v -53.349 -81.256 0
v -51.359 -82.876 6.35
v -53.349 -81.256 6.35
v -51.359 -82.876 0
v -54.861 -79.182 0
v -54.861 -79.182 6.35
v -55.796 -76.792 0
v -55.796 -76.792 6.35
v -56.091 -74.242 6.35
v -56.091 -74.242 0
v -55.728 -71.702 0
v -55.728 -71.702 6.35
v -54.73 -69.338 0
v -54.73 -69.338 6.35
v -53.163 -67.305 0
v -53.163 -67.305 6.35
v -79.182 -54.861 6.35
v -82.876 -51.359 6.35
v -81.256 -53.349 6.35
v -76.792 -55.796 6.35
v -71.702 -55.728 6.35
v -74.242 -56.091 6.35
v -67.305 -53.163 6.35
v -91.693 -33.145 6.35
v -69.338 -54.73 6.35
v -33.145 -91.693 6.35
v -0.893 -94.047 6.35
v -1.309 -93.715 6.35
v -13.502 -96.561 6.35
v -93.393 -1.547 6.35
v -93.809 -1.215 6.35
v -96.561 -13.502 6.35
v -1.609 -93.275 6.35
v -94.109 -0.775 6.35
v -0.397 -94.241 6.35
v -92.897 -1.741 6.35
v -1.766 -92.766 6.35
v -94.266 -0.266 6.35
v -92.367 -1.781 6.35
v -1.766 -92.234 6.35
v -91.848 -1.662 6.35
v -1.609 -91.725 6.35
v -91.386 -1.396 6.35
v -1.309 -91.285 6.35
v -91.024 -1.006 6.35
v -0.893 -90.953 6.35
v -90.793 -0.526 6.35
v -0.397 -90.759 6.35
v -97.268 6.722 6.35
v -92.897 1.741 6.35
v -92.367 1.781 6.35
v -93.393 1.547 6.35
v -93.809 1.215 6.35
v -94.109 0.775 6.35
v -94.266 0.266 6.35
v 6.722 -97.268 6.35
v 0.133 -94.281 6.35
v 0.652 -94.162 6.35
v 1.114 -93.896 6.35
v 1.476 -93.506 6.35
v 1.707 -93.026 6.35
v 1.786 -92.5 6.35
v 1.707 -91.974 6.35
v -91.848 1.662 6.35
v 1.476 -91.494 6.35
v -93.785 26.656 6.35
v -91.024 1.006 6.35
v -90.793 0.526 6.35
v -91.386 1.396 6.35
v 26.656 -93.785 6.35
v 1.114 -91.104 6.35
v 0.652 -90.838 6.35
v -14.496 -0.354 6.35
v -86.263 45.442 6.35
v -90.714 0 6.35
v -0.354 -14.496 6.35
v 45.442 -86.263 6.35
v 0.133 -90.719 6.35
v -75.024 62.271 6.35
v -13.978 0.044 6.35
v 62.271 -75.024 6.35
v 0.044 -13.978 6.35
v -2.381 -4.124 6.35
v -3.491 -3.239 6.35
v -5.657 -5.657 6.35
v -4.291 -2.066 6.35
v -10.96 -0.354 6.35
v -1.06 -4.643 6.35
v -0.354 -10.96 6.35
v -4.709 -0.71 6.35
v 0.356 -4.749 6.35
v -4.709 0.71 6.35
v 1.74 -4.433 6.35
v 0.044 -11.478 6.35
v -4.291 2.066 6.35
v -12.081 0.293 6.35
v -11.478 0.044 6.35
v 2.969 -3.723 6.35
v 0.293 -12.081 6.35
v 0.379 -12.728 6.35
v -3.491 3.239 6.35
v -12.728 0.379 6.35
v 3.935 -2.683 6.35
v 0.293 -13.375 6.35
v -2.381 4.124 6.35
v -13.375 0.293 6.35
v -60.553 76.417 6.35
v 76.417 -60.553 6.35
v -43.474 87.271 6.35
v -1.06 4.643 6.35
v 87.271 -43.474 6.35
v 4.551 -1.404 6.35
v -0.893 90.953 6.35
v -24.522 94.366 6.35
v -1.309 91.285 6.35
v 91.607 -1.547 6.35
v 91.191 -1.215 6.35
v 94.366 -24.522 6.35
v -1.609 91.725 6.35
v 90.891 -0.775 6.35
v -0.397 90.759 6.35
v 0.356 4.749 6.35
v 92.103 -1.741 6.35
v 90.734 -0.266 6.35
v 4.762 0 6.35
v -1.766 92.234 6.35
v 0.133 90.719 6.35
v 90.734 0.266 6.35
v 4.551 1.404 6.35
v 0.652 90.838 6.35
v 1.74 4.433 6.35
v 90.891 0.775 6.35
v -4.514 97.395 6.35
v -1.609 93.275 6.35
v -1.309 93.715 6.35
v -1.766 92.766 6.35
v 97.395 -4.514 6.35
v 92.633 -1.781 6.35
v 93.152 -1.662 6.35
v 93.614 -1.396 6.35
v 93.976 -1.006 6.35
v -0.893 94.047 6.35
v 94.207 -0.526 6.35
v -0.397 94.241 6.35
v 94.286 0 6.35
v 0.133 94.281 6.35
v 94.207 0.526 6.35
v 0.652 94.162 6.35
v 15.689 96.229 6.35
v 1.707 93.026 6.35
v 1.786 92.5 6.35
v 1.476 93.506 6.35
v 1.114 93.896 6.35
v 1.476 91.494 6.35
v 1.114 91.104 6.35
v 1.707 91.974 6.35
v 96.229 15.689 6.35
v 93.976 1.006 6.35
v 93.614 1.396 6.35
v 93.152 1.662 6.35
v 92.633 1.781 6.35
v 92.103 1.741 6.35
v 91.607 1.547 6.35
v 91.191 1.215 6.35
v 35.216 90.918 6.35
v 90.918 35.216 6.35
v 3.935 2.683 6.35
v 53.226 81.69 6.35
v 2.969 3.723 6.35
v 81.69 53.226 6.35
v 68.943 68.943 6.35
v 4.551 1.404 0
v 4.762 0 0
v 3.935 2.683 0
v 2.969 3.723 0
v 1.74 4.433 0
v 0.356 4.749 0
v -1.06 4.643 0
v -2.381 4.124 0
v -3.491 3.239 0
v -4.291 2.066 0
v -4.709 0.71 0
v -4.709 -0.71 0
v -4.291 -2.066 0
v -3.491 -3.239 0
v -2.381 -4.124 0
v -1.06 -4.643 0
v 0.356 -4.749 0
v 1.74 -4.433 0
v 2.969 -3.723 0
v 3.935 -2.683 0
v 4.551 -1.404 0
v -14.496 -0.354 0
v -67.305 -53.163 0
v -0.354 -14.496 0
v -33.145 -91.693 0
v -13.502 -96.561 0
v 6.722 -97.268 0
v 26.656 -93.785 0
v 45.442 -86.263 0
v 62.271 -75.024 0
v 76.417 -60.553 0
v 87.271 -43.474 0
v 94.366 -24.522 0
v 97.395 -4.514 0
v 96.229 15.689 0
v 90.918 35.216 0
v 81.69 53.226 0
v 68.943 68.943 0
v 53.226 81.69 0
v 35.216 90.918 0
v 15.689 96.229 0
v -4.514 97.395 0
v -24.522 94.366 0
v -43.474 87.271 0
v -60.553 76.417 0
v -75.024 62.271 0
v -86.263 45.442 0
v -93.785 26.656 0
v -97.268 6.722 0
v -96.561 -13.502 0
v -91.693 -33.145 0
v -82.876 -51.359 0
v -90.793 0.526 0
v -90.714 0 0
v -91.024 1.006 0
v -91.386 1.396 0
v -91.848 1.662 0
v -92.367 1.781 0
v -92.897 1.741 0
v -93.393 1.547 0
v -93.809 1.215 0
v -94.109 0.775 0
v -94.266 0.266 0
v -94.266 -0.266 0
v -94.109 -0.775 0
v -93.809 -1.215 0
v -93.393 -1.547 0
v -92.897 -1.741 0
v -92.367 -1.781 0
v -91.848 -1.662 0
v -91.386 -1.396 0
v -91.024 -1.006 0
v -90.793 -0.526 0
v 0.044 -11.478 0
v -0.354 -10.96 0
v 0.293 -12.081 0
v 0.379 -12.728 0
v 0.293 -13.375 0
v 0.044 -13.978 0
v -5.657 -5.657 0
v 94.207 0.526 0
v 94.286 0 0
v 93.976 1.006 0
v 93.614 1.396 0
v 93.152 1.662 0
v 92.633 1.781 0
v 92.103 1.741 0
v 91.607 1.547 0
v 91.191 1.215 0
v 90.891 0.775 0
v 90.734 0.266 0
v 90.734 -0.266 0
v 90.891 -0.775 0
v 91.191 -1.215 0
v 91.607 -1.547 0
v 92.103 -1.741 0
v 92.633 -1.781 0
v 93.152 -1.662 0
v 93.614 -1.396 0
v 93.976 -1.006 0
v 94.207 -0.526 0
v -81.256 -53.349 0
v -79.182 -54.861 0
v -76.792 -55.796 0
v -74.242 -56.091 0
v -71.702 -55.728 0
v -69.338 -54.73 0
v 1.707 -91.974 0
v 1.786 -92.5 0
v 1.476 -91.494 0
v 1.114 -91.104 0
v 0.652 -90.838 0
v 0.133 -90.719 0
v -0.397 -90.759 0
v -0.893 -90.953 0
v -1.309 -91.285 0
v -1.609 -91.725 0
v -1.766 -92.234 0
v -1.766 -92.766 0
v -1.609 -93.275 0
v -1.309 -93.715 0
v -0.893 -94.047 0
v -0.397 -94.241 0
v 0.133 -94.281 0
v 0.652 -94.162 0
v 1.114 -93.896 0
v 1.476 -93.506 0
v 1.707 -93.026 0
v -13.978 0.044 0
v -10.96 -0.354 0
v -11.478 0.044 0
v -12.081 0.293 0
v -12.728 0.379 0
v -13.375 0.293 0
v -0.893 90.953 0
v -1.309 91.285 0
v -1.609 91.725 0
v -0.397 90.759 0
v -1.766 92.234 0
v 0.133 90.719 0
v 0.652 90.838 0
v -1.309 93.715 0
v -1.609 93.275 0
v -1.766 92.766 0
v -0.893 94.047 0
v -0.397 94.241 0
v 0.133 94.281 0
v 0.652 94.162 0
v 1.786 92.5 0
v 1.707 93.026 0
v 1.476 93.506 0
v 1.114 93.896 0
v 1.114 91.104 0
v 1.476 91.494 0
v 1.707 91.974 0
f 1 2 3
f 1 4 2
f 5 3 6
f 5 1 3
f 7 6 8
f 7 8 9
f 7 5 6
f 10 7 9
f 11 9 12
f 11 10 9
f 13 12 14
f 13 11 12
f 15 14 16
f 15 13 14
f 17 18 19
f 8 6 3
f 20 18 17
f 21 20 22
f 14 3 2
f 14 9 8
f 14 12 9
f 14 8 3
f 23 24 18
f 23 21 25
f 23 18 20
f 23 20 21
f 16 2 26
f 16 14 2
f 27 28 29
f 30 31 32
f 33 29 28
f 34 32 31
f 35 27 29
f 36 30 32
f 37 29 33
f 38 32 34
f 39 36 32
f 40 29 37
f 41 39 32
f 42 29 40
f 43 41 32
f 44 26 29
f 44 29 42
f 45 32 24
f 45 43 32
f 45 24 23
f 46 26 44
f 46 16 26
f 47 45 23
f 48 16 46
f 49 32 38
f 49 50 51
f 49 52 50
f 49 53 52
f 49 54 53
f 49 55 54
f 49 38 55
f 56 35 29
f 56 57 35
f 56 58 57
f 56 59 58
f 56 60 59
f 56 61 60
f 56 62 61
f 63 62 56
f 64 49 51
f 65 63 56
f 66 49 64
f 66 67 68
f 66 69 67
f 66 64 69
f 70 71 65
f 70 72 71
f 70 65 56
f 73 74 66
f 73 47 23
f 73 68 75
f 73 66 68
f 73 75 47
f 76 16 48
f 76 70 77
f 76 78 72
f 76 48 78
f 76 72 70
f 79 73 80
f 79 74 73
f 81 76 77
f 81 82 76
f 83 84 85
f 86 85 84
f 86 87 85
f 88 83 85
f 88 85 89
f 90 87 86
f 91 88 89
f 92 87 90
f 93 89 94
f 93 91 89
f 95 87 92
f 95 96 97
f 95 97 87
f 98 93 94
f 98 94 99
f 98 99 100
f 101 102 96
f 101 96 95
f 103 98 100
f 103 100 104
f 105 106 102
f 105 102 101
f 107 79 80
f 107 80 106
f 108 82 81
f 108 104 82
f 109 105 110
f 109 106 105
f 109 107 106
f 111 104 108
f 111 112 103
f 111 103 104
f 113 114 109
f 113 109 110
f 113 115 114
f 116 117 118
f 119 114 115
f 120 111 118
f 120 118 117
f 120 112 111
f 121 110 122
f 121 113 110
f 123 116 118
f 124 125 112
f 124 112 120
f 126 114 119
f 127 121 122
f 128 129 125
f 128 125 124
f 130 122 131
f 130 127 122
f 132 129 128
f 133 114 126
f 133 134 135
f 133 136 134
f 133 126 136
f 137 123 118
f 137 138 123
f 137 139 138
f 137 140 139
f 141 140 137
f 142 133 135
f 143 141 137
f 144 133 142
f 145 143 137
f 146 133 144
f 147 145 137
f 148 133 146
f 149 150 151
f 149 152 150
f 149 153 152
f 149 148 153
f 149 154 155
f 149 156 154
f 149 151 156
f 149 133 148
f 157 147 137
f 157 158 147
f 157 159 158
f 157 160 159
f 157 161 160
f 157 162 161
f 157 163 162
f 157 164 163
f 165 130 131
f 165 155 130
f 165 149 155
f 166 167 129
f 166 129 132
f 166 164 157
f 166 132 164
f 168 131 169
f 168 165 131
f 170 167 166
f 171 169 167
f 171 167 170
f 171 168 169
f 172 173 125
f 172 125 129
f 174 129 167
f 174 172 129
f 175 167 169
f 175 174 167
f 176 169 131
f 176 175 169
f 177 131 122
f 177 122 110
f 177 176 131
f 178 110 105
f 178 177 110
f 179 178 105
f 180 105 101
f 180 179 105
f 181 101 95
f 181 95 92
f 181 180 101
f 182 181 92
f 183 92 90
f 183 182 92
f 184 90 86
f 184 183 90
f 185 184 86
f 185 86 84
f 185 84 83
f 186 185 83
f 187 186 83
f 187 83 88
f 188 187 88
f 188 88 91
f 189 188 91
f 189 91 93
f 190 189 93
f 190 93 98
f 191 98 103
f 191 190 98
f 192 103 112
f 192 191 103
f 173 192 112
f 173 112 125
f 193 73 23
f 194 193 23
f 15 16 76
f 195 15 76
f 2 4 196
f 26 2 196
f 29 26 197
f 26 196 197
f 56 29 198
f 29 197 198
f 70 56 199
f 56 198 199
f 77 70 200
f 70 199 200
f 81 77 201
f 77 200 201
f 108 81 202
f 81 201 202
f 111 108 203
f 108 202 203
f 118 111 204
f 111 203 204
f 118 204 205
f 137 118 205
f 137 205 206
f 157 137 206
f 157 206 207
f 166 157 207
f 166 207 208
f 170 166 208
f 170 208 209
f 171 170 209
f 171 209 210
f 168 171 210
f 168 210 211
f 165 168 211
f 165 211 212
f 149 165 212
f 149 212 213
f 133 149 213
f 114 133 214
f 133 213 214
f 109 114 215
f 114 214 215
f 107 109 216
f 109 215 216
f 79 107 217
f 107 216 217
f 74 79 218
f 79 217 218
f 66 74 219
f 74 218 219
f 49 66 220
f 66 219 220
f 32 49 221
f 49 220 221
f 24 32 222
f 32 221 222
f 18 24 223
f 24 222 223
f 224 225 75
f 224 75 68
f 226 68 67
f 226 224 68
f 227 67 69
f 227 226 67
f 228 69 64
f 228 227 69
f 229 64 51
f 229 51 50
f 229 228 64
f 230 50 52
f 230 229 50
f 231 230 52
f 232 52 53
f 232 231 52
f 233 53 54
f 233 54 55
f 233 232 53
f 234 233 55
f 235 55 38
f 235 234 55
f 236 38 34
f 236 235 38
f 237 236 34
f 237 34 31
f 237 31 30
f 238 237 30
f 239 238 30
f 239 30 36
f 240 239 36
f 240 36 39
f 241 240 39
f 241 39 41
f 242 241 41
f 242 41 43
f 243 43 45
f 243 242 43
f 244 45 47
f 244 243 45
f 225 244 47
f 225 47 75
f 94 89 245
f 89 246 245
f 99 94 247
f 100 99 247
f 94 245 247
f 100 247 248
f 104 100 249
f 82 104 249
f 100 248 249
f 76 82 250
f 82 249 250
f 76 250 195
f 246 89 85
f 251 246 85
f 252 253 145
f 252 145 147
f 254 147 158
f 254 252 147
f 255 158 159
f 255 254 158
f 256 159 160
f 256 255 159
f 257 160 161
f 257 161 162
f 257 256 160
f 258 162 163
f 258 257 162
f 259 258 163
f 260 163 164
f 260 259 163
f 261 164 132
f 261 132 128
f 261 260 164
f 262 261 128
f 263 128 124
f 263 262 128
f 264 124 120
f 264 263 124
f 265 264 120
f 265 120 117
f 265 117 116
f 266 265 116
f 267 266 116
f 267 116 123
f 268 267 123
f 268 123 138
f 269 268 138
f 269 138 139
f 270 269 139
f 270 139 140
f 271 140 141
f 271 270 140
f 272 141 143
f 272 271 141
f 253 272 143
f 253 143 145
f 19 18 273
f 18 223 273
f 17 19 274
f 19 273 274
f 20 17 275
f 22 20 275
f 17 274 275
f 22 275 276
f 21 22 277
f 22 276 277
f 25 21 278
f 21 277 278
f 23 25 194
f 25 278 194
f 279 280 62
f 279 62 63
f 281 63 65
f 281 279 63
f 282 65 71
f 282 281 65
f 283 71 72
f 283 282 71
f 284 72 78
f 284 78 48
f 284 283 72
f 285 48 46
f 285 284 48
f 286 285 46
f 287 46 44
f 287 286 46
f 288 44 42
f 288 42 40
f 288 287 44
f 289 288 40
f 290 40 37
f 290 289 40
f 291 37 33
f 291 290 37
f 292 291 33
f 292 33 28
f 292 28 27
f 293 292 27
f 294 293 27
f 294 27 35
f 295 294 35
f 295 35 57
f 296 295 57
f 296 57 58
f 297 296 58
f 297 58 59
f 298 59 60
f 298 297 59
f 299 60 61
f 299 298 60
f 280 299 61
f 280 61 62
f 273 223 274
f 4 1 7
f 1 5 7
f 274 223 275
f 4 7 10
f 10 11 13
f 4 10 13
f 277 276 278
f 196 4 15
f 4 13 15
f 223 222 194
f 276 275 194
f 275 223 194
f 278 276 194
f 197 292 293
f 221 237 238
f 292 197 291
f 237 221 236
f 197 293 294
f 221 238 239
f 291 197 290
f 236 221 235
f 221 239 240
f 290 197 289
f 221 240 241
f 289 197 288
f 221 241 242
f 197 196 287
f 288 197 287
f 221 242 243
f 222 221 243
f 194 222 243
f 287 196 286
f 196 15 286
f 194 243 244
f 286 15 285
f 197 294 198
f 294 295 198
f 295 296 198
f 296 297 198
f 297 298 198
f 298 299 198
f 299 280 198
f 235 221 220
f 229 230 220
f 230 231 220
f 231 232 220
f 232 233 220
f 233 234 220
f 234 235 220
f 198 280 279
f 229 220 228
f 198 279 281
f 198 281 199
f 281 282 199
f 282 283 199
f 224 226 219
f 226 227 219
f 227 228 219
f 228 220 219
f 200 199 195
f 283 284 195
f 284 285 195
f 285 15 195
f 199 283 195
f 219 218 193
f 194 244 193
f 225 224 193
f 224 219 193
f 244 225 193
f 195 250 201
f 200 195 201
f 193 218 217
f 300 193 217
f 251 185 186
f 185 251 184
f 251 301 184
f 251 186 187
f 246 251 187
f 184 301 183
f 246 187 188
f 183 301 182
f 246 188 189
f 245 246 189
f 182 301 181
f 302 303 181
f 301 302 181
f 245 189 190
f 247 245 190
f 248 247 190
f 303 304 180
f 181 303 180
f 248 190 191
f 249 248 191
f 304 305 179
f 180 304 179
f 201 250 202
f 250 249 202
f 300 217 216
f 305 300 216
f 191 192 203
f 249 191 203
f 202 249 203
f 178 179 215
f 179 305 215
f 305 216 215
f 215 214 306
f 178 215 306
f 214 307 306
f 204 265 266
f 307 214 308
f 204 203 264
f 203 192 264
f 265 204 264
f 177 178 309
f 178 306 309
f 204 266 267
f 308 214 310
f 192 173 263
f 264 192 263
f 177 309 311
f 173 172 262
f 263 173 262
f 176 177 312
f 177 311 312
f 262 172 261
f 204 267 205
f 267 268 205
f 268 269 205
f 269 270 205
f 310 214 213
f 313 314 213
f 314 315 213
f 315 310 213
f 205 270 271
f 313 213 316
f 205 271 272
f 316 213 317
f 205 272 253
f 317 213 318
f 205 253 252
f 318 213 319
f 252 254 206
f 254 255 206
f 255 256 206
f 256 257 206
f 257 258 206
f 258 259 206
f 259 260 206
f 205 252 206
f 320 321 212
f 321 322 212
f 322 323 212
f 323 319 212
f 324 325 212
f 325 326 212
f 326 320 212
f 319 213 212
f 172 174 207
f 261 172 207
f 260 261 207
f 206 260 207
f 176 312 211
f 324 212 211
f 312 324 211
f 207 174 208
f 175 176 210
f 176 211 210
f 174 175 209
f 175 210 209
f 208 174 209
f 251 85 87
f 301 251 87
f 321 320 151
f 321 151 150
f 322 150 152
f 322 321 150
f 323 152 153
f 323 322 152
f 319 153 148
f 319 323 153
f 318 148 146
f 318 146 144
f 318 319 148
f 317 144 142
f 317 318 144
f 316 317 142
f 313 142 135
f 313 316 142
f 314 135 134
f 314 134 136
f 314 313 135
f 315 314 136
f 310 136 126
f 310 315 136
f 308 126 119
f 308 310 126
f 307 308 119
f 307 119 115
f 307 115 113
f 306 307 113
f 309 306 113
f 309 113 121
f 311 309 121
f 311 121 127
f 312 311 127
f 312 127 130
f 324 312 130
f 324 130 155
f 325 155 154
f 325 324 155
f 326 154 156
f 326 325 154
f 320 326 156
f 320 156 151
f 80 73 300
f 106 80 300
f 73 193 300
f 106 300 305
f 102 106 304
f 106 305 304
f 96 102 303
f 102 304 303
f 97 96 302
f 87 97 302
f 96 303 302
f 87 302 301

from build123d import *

# Parameters (mm, degrees)
SKETCH1_R           = 97.5
SKETCH1_R_2         = 4.7625
SKETCH1_R_3         = 1.7859375
BOSS_EXTRUDE1_DEPTH = 6.35
CUT_EXTRUDE3_REACH  = 140.032
FILLET2_R           = 10
FILLET3_R           = 2.5


with BuildPart() as part:
    # Sketch1 → Boss-Extrude1 (new body)
    with BuildSketch(Plane.XY):
        Circle(SKETCH1_R)
        Circle(SKETCH1_R_2, mode=Mode.SUBTRACT)
        with Locations((0, 92.5)):
            Circle(SKETCH1_R_3, mode=Mode.SUBTRACT)
        with Locations((92.5, 0)):
            Circle(SKETCH1_R_3, mode=Mode.SUBTRACT)
        with Locations((0, -92.5)):
            Circle(SKETCH1_R_3, mode=Mode.SUBTRACT)
        with Locations((-92.5, 0)):
            Circle(SKETCH1_R_3, mode=Mode.SUBTRACT)
    extrude(amount=BOSS_EXTRUDE1_DEPTH)

    # Sketch5 → Cut-Extrude3 (cut, up to next)
    with BuildSketch(Plane.XY.offset(6.35), mode=Mode.PRIVATE) as cut_extrude3_sk1:
        with BuildLine():
            Line((1.414213562, -12.727922061), (-5.656854249, -5.656854249))
            Line((-5.656854249, -5.656854249), (-68.942911166, -68.942911166))
            ThreePointArc((-68.942911166, -68.942911166), (-65.311752388, -72.392161178), (-61.50826581, -75.650401434))
            Line((-61.50826581, -75.650401434), (1.414213562, -12.727922061))
        make_face()
    cut_extrude3_tool1 = extrude(cut_extrude3_sk1.sketch, amount=-CUT_EXTRUDE3_REACH, mode=Mode.PRIVATE) & part.part
    # Sketch5 → Cut-Extrude3 (cut, up to next)
    with BuildSketch(Plane.XY.offset(6.35), mode=Mode.PRIVATE) as cut_extrude3_sk2:
        with BuildLine():
            Line((-68.942911166, -68.942911166), (-5.656854249, -5.656854249))
            Line((-5.656854249, -5.656854249), (-12.727922061, 1.414213562))
            Line((-12.727922061, 1.414213562), (-75.650401434, -61.50826581))
            ThreePointArc((-75.650401434, -61.50826581), (-72.392161178, -65.311752388), (-68.942911166, -68.942911166))
        make_face()
    cut_extrude3_tool2 = extrude(cut_extrude3_sk2.sketch, amount=-CUT_EXTRUDE3_REACH, mode=Mode.PRIVATE) & part.part
    add(cut_extrude3_tool1.solids().sort_by_distance((-33.7073, -40.771587, 6.35))[0], mode=Mode.SUBTRACT)
    add(cut_extrude3_tool2.solids().sort_by_distance((-40.771587, -33.7073, 6.35))[0], mode=Mode.SUBTRACT)

    # Fillet2
    fillet2_edges = [part.edges().sort_by_distance(p)[0] for p in [
        (-61.50826581, -75.650401434, 3.175),
        (-75.650401434, -61.50826581, 3.175),
    ]]
    fillet(fillet2_edges, radius=FILLET2_R)

    # Fillet3
    fillet3_edges = [part.edges().sort_by_distance(p)[0] for p in [
        (-12.727922061, 1.414213562, 3.175),
        (1.414213562, -12.727922061, 3.175),
    ]]
    fillet(fillet3_edges, radius=FILLET3_R)


solid = part.part
